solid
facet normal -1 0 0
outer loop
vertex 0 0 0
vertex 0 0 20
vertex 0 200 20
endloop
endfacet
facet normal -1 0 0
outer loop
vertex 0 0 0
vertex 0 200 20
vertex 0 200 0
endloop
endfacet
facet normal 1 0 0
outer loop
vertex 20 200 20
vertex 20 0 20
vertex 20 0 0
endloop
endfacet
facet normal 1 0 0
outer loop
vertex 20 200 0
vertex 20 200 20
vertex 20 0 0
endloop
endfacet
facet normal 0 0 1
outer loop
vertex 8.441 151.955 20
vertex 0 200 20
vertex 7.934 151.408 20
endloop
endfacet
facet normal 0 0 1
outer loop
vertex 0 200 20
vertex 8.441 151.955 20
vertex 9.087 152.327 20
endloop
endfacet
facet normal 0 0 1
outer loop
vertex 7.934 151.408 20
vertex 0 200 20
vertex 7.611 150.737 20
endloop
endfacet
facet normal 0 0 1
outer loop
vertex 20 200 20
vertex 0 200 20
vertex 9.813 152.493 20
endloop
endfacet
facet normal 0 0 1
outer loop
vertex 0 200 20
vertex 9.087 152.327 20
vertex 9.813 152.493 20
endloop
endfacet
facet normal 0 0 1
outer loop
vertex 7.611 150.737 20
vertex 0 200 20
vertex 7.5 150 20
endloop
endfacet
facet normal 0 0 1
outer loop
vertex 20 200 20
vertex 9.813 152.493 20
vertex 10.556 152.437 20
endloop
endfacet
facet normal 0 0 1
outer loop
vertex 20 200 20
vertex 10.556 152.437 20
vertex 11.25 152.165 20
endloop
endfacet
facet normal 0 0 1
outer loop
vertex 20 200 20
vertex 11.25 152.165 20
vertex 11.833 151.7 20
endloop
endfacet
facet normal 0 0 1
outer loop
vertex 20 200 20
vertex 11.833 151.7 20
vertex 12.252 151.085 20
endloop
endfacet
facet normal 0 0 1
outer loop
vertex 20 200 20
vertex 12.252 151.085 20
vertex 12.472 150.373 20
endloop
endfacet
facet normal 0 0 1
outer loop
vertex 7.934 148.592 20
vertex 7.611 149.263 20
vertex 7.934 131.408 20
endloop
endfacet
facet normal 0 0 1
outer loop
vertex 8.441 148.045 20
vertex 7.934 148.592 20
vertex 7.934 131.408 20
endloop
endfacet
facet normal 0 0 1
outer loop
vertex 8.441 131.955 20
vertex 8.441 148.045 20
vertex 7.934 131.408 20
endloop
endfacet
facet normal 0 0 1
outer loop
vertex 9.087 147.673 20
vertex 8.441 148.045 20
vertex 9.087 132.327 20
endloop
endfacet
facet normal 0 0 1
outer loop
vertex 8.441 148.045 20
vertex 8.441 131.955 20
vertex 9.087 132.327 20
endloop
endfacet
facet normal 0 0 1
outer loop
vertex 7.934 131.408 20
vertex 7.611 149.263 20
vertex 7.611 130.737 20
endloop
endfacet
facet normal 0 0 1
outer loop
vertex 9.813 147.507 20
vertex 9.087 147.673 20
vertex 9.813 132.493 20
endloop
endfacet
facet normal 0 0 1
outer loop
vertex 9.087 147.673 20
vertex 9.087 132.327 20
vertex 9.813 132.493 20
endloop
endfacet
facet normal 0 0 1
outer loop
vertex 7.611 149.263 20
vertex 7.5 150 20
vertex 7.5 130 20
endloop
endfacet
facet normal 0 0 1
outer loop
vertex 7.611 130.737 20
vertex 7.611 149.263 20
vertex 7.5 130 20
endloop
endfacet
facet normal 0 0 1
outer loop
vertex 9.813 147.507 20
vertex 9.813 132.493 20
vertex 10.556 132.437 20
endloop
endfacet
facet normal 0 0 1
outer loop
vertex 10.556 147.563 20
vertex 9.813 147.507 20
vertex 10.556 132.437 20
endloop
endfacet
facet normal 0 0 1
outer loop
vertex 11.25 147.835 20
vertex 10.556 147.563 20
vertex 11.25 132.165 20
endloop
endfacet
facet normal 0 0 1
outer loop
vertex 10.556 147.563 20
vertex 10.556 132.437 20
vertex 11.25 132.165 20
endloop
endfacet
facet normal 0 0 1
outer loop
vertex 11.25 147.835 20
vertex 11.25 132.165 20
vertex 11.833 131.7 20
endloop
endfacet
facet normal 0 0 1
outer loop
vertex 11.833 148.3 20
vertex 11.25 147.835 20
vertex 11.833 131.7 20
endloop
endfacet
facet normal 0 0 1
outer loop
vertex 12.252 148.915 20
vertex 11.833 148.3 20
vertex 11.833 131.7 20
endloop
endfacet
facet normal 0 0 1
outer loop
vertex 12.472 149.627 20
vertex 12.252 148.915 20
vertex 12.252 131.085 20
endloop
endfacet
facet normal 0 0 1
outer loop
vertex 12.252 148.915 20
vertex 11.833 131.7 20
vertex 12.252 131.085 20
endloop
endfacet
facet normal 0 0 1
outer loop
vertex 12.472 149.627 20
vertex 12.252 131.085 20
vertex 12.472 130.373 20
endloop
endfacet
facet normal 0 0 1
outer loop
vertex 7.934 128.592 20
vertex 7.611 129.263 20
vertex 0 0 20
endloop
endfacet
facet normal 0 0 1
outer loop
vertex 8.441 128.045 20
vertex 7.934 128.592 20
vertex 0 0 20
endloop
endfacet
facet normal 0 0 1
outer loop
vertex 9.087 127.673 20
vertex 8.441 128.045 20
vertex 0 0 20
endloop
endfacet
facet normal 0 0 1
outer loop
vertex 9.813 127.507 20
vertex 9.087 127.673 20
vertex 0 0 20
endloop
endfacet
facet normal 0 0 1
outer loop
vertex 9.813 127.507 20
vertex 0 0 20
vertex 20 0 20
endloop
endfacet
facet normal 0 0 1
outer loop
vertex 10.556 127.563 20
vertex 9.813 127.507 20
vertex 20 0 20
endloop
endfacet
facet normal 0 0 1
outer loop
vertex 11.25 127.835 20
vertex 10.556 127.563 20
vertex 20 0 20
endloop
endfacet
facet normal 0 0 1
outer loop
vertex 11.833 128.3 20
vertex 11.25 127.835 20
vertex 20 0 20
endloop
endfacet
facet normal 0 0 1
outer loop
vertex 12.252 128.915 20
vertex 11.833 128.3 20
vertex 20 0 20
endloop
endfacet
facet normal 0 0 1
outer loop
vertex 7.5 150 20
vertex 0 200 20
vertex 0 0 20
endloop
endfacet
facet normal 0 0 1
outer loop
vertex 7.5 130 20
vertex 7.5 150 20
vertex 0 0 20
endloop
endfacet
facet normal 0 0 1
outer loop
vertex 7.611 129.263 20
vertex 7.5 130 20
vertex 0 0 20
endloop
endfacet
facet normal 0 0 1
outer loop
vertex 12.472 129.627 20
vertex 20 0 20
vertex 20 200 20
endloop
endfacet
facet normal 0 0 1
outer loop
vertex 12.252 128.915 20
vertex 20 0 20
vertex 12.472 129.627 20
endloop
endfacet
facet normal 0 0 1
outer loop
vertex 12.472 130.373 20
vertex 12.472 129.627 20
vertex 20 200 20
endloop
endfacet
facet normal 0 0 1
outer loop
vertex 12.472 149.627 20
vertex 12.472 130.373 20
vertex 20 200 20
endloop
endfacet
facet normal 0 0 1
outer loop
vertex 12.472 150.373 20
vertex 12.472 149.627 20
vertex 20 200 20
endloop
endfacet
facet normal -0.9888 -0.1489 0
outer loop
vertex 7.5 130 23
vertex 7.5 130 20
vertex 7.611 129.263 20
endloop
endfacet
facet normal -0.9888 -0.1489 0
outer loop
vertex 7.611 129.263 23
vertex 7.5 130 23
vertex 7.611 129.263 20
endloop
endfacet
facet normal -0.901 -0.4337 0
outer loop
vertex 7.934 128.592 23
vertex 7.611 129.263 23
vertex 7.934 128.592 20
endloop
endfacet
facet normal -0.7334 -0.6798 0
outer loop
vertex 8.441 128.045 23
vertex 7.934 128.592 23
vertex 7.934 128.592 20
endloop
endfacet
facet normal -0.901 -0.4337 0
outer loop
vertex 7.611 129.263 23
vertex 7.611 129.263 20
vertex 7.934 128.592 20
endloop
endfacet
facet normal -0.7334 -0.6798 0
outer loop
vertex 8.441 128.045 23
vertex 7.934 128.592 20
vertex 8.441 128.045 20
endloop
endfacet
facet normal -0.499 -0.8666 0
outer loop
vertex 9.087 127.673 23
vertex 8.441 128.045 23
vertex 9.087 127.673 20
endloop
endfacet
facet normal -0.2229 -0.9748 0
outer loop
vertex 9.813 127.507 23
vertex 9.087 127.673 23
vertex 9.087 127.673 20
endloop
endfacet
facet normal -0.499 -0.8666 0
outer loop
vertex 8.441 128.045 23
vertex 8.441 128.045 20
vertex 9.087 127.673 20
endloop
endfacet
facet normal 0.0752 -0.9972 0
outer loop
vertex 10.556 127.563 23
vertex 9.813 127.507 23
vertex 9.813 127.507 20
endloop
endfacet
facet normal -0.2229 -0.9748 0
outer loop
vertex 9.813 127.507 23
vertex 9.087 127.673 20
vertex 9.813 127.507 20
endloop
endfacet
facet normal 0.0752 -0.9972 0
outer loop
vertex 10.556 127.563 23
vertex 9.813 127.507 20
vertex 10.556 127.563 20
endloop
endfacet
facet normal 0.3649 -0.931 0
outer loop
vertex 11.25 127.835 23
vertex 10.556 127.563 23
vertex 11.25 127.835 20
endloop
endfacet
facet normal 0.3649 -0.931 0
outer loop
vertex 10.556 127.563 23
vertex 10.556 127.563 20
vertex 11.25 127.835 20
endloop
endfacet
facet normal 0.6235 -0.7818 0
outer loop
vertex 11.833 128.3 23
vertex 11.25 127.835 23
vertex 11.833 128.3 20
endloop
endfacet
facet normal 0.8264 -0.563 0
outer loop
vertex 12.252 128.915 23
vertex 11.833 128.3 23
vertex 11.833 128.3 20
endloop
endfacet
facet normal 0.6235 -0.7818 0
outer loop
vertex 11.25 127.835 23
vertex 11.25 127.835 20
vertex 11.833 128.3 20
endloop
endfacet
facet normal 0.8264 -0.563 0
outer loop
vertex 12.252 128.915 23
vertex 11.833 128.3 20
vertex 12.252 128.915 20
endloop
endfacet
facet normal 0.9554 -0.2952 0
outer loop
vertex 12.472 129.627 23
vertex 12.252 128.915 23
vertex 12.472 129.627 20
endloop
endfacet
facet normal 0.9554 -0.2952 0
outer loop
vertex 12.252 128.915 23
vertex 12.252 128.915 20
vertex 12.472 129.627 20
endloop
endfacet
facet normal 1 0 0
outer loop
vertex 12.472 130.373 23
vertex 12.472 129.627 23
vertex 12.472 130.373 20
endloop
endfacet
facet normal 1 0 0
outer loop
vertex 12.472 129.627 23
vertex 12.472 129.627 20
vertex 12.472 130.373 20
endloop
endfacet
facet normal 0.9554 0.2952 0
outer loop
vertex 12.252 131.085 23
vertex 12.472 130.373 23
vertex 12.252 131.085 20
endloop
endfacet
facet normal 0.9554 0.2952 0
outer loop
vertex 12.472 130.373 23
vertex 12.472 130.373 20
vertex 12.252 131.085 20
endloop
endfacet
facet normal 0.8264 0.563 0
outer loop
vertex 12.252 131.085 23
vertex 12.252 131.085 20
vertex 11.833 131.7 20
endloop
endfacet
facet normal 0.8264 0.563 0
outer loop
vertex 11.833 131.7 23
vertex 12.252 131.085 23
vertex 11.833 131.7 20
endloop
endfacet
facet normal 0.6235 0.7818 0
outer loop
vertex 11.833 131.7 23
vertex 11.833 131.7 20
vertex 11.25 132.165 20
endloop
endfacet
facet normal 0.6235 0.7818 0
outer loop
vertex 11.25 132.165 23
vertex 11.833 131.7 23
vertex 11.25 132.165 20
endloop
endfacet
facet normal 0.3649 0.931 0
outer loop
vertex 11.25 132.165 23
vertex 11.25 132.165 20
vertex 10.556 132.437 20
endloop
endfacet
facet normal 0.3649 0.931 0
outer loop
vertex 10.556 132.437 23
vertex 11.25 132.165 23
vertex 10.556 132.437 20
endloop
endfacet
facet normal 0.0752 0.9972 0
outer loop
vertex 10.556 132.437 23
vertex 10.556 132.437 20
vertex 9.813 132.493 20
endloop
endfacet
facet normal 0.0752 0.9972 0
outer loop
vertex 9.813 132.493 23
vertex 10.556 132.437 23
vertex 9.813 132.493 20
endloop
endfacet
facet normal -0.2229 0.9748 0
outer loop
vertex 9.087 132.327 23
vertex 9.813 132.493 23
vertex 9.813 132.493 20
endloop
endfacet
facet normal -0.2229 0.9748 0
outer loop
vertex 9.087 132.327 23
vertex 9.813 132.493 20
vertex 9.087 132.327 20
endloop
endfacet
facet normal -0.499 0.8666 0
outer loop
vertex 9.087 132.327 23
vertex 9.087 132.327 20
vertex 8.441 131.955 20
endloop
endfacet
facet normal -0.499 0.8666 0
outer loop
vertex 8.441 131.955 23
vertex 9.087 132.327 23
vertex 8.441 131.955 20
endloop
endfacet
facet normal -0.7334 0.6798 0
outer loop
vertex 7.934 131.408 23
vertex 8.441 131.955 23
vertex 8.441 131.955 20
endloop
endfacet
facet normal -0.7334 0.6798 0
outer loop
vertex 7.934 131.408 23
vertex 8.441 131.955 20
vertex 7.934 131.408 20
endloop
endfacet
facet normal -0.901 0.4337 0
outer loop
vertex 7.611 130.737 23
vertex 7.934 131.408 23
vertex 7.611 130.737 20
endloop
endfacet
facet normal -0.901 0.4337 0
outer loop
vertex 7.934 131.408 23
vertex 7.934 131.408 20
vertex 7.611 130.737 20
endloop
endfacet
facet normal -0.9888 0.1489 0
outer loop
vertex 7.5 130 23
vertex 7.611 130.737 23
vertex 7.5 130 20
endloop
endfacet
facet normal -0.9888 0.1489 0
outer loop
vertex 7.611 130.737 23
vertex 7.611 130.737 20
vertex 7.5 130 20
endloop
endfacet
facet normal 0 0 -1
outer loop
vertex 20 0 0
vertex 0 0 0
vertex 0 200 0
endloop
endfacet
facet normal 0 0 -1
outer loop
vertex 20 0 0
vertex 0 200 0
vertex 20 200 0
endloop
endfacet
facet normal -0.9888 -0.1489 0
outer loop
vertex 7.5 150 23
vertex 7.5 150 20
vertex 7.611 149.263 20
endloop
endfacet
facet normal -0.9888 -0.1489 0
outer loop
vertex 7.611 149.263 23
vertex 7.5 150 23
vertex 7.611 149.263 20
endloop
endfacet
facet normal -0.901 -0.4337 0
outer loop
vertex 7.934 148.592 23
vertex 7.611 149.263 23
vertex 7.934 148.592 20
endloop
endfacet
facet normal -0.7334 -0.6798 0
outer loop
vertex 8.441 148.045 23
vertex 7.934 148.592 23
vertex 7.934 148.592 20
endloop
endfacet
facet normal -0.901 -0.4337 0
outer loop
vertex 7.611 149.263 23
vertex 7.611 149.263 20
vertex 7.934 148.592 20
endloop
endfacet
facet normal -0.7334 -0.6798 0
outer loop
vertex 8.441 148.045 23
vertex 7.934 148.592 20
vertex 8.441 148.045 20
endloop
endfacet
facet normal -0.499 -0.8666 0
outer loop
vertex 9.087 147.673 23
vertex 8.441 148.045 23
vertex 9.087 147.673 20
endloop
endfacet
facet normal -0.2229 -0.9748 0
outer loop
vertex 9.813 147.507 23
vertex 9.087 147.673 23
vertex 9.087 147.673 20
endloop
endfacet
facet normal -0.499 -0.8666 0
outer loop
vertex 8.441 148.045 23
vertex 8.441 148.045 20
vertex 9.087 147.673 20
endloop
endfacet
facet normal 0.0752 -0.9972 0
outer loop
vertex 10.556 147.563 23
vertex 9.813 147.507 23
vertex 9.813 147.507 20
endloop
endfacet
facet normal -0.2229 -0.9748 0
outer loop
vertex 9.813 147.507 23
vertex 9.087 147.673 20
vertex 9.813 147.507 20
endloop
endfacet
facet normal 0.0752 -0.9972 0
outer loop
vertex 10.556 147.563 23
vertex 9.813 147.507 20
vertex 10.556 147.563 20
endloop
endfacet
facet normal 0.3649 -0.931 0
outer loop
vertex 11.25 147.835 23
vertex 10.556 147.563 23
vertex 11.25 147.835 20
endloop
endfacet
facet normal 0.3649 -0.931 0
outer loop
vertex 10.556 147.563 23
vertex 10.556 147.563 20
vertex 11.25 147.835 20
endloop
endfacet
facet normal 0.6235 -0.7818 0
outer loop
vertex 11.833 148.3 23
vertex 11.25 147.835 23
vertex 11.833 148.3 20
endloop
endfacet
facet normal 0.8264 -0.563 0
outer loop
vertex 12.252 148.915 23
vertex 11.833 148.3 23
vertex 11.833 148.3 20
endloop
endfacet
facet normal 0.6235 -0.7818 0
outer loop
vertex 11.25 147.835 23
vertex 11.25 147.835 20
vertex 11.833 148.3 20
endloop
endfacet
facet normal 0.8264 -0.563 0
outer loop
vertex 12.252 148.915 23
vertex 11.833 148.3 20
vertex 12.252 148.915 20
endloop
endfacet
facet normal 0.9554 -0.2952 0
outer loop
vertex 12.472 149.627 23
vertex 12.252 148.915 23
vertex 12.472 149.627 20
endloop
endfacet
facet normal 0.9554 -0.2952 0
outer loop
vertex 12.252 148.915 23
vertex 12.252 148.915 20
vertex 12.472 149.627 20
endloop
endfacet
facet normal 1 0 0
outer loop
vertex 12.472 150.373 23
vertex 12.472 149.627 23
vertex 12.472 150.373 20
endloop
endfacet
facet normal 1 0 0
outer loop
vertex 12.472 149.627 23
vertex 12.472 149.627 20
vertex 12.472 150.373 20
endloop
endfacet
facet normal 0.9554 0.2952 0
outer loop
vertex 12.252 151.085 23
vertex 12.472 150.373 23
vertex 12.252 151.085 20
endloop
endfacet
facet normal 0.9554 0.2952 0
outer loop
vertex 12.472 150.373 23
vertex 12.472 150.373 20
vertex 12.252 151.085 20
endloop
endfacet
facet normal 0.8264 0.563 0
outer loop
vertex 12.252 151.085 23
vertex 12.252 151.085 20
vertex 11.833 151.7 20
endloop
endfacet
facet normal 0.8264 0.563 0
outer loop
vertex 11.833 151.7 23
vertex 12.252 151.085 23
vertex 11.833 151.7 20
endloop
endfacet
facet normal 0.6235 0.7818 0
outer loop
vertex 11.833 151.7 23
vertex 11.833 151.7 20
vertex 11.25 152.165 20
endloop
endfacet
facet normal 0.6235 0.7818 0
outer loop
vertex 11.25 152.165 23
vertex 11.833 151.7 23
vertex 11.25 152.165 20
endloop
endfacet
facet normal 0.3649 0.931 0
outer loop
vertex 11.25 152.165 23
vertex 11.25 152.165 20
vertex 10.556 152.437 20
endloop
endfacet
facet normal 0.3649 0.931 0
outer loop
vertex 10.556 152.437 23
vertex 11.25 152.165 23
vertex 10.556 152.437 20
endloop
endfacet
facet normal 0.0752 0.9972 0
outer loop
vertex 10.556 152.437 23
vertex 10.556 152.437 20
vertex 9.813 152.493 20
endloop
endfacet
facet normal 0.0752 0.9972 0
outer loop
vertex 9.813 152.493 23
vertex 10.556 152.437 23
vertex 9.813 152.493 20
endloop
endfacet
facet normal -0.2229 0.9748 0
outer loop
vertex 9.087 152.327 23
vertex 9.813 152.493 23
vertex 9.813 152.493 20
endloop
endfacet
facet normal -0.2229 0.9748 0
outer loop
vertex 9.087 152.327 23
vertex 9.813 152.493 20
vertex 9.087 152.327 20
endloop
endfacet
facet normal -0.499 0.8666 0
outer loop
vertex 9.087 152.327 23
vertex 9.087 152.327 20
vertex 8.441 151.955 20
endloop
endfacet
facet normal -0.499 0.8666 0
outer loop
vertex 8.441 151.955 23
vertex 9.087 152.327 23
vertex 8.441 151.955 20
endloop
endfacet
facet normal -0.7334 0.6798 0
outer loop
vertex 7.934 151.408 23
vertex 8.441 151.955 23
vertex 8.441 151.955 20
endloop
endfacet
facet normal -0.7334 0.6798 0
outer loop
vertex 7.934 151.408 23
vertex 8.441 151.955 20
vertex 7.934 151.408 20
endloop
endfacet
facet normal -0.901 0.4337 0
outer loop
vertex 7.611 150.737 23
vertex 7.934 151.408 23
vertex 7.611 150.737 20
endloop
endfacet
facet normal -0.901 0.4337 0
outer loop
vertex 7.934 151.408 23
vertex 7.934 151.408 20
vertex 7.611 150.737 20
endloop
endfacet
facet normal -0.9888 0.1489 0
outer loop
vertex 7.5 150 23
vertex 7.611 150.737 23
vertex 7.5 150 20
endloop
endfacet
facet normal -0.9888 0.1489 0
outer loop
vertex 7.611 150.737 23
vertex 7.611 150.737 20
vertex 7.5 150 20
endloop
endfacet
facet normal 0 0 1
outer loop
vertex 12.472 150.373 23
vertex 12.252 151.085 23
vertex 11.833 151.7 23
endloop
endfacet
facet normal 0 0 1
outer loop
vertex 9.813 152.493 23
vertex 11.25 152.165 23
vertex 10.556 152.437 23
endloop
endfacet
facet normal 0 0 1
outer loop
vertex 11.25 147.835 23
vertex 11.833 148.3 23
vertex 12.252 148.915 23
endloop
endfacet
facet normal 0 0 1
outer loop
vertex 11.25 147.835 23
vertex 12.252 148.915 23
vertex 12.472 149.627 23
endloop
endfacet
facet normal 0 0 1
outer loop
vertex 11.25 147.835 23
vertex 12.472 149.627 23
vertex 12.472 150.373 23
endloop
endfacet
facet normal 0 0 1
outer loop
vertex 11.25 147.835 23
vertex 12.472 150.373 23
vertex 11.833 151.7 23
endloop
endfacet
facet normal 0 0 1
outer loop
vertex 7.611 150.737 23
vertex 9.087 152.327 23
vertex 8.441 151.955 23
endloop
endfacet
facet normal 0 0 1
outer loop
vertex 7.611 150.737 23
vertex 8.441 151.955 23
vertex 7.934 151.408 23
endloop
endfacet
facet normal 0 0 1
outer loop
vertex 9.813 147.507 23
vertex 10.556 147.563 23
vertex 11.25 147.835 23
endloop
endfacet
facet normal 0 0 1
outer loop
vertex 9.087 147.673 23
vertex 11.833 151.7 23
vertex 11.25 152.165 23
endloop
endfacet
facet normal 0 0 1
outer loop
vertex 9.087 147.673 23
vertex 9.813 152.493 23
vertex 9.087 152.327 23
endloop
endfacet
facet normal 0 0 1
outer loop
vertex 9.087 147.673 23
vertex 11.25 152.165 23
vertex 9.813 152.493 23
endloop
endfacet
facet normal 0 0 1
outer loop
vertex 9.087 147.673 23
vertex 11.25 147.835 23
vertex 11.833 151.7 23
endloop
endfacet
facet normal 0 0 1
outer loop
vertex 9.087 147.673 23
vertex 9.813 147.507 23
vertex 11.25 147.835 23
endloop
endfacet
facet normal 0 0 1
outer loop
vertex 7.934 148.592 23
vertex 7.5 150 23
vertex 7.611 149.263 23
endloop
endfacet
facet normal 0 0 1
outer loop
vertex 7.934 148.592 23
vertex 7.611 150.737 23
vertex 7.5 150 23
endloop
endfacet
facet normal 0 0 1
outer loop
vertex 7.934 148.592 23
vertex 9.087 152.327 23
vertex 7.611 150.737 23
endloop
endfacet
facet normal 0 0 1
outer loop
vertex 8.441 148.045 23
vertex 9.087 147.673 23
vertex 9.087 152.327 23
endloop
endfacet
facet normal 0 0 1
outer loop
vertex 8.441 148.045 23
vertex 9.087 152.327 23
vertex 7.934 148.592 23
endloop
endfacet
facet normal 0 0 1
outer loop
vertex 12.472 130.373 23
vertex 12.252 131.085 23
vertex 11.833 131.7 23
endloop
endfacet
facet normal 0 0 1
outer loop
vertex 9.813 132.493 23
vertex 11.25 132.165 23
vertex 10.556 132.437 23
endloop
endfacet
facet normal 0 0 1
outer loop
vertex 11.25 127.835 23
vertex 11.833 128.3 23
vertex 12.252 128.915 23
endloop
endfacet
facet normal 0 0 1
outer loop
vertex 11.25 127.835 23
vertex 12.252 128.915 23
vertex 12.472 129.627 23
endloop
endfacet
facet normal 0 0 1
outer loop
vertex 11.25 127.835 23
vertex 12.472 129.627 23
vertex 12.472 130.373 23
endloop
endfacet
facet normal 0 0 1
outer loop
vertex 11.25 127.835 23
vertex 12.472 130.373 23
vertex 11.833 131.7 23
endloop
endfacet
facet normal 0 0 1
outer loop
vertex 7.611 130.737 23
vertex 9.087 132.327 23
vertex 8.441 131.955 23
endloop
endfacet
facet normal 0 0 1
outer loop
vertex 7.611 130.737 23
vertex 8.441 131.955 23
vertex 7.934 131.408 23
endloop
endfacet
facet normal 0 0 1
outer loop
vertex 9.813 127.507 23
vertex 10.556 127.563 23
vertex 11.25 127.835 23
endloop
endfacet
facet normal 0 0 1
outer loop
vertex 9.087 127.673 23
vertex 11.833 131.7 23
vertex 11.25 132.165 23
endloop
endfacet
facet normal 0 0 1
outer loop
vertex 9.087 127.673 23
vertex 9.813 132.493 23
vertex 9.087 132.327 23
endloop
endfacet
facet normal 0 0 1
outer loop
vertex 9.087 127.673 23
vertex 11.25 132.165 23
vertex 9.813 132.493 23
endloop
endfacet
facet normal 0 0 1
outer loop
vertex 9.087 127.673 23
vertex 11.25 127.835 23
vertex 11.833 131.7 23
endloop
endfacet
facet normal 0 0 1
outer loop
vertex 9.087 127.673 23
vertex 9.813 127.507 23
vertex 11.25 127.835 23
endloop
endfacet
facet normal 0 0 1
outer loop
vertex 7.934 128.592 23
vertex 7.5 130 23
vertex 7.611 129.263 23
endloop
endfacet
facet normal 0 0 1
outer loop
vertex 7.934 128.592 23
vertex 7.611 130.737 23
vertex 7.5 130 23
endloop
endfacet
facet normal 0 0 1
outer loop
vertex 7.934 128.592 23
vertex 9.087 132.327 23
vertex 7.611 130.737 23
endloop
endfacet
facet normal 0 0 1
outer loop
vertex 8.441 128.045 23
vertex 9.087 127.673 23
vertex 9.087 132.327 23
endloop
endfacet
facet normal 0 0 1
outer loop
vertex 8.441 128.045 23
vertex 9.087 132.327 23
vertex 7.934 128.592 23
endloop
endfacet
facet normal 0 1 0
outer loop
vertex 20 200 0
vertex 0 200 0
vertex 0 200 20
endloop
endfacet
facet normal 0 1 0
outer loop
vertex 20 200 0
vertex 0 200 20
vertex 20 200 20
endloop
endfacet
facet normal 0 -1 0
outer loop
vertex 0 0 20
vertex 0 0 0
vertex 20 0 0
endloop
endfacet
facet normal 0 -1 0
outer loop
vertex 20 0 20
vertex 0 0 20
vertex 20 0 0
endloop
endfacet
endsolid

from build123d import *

# Parameters (mm, degrees)
SKETCH4_W           = 20
SKETCH4_H           = 20
BOSS_EXTRUDE2_DEPTH = 200
SKETCH5_R           = 2.5
BOSS_EXTRUDE3_DEPTH = 3


with BuildPart() as part:
    # Sketch4 → Boss-Extrude2 (new body)
    with BuildSketch(Plane(origin=(0, 0, 0), x_dir=(1, 0, 0), z_dir=(0, 1, 0))):
        with Locations((10, -10)):
            Rectangle(SKETCH4_W, SKETCH4_H)
    extrude(amount=BOSS_EXTRUDE2_DEPTH)

    # Sketch5 → Boss-Extrude3 (add)
    with BuildSketch(Plane.XY.offset(20)):
        with Locations(Location((10, 150, 0), (0, 0, 180))):
            Circle(SKETCH5_R)
        with Locations(Location((10, 130, 0), (0, 0, 180))):
            Circle(SKETCH5_R)
    extrude(amount=BOSS_EXTRUDE3_DEPTH)


solid = part.part
